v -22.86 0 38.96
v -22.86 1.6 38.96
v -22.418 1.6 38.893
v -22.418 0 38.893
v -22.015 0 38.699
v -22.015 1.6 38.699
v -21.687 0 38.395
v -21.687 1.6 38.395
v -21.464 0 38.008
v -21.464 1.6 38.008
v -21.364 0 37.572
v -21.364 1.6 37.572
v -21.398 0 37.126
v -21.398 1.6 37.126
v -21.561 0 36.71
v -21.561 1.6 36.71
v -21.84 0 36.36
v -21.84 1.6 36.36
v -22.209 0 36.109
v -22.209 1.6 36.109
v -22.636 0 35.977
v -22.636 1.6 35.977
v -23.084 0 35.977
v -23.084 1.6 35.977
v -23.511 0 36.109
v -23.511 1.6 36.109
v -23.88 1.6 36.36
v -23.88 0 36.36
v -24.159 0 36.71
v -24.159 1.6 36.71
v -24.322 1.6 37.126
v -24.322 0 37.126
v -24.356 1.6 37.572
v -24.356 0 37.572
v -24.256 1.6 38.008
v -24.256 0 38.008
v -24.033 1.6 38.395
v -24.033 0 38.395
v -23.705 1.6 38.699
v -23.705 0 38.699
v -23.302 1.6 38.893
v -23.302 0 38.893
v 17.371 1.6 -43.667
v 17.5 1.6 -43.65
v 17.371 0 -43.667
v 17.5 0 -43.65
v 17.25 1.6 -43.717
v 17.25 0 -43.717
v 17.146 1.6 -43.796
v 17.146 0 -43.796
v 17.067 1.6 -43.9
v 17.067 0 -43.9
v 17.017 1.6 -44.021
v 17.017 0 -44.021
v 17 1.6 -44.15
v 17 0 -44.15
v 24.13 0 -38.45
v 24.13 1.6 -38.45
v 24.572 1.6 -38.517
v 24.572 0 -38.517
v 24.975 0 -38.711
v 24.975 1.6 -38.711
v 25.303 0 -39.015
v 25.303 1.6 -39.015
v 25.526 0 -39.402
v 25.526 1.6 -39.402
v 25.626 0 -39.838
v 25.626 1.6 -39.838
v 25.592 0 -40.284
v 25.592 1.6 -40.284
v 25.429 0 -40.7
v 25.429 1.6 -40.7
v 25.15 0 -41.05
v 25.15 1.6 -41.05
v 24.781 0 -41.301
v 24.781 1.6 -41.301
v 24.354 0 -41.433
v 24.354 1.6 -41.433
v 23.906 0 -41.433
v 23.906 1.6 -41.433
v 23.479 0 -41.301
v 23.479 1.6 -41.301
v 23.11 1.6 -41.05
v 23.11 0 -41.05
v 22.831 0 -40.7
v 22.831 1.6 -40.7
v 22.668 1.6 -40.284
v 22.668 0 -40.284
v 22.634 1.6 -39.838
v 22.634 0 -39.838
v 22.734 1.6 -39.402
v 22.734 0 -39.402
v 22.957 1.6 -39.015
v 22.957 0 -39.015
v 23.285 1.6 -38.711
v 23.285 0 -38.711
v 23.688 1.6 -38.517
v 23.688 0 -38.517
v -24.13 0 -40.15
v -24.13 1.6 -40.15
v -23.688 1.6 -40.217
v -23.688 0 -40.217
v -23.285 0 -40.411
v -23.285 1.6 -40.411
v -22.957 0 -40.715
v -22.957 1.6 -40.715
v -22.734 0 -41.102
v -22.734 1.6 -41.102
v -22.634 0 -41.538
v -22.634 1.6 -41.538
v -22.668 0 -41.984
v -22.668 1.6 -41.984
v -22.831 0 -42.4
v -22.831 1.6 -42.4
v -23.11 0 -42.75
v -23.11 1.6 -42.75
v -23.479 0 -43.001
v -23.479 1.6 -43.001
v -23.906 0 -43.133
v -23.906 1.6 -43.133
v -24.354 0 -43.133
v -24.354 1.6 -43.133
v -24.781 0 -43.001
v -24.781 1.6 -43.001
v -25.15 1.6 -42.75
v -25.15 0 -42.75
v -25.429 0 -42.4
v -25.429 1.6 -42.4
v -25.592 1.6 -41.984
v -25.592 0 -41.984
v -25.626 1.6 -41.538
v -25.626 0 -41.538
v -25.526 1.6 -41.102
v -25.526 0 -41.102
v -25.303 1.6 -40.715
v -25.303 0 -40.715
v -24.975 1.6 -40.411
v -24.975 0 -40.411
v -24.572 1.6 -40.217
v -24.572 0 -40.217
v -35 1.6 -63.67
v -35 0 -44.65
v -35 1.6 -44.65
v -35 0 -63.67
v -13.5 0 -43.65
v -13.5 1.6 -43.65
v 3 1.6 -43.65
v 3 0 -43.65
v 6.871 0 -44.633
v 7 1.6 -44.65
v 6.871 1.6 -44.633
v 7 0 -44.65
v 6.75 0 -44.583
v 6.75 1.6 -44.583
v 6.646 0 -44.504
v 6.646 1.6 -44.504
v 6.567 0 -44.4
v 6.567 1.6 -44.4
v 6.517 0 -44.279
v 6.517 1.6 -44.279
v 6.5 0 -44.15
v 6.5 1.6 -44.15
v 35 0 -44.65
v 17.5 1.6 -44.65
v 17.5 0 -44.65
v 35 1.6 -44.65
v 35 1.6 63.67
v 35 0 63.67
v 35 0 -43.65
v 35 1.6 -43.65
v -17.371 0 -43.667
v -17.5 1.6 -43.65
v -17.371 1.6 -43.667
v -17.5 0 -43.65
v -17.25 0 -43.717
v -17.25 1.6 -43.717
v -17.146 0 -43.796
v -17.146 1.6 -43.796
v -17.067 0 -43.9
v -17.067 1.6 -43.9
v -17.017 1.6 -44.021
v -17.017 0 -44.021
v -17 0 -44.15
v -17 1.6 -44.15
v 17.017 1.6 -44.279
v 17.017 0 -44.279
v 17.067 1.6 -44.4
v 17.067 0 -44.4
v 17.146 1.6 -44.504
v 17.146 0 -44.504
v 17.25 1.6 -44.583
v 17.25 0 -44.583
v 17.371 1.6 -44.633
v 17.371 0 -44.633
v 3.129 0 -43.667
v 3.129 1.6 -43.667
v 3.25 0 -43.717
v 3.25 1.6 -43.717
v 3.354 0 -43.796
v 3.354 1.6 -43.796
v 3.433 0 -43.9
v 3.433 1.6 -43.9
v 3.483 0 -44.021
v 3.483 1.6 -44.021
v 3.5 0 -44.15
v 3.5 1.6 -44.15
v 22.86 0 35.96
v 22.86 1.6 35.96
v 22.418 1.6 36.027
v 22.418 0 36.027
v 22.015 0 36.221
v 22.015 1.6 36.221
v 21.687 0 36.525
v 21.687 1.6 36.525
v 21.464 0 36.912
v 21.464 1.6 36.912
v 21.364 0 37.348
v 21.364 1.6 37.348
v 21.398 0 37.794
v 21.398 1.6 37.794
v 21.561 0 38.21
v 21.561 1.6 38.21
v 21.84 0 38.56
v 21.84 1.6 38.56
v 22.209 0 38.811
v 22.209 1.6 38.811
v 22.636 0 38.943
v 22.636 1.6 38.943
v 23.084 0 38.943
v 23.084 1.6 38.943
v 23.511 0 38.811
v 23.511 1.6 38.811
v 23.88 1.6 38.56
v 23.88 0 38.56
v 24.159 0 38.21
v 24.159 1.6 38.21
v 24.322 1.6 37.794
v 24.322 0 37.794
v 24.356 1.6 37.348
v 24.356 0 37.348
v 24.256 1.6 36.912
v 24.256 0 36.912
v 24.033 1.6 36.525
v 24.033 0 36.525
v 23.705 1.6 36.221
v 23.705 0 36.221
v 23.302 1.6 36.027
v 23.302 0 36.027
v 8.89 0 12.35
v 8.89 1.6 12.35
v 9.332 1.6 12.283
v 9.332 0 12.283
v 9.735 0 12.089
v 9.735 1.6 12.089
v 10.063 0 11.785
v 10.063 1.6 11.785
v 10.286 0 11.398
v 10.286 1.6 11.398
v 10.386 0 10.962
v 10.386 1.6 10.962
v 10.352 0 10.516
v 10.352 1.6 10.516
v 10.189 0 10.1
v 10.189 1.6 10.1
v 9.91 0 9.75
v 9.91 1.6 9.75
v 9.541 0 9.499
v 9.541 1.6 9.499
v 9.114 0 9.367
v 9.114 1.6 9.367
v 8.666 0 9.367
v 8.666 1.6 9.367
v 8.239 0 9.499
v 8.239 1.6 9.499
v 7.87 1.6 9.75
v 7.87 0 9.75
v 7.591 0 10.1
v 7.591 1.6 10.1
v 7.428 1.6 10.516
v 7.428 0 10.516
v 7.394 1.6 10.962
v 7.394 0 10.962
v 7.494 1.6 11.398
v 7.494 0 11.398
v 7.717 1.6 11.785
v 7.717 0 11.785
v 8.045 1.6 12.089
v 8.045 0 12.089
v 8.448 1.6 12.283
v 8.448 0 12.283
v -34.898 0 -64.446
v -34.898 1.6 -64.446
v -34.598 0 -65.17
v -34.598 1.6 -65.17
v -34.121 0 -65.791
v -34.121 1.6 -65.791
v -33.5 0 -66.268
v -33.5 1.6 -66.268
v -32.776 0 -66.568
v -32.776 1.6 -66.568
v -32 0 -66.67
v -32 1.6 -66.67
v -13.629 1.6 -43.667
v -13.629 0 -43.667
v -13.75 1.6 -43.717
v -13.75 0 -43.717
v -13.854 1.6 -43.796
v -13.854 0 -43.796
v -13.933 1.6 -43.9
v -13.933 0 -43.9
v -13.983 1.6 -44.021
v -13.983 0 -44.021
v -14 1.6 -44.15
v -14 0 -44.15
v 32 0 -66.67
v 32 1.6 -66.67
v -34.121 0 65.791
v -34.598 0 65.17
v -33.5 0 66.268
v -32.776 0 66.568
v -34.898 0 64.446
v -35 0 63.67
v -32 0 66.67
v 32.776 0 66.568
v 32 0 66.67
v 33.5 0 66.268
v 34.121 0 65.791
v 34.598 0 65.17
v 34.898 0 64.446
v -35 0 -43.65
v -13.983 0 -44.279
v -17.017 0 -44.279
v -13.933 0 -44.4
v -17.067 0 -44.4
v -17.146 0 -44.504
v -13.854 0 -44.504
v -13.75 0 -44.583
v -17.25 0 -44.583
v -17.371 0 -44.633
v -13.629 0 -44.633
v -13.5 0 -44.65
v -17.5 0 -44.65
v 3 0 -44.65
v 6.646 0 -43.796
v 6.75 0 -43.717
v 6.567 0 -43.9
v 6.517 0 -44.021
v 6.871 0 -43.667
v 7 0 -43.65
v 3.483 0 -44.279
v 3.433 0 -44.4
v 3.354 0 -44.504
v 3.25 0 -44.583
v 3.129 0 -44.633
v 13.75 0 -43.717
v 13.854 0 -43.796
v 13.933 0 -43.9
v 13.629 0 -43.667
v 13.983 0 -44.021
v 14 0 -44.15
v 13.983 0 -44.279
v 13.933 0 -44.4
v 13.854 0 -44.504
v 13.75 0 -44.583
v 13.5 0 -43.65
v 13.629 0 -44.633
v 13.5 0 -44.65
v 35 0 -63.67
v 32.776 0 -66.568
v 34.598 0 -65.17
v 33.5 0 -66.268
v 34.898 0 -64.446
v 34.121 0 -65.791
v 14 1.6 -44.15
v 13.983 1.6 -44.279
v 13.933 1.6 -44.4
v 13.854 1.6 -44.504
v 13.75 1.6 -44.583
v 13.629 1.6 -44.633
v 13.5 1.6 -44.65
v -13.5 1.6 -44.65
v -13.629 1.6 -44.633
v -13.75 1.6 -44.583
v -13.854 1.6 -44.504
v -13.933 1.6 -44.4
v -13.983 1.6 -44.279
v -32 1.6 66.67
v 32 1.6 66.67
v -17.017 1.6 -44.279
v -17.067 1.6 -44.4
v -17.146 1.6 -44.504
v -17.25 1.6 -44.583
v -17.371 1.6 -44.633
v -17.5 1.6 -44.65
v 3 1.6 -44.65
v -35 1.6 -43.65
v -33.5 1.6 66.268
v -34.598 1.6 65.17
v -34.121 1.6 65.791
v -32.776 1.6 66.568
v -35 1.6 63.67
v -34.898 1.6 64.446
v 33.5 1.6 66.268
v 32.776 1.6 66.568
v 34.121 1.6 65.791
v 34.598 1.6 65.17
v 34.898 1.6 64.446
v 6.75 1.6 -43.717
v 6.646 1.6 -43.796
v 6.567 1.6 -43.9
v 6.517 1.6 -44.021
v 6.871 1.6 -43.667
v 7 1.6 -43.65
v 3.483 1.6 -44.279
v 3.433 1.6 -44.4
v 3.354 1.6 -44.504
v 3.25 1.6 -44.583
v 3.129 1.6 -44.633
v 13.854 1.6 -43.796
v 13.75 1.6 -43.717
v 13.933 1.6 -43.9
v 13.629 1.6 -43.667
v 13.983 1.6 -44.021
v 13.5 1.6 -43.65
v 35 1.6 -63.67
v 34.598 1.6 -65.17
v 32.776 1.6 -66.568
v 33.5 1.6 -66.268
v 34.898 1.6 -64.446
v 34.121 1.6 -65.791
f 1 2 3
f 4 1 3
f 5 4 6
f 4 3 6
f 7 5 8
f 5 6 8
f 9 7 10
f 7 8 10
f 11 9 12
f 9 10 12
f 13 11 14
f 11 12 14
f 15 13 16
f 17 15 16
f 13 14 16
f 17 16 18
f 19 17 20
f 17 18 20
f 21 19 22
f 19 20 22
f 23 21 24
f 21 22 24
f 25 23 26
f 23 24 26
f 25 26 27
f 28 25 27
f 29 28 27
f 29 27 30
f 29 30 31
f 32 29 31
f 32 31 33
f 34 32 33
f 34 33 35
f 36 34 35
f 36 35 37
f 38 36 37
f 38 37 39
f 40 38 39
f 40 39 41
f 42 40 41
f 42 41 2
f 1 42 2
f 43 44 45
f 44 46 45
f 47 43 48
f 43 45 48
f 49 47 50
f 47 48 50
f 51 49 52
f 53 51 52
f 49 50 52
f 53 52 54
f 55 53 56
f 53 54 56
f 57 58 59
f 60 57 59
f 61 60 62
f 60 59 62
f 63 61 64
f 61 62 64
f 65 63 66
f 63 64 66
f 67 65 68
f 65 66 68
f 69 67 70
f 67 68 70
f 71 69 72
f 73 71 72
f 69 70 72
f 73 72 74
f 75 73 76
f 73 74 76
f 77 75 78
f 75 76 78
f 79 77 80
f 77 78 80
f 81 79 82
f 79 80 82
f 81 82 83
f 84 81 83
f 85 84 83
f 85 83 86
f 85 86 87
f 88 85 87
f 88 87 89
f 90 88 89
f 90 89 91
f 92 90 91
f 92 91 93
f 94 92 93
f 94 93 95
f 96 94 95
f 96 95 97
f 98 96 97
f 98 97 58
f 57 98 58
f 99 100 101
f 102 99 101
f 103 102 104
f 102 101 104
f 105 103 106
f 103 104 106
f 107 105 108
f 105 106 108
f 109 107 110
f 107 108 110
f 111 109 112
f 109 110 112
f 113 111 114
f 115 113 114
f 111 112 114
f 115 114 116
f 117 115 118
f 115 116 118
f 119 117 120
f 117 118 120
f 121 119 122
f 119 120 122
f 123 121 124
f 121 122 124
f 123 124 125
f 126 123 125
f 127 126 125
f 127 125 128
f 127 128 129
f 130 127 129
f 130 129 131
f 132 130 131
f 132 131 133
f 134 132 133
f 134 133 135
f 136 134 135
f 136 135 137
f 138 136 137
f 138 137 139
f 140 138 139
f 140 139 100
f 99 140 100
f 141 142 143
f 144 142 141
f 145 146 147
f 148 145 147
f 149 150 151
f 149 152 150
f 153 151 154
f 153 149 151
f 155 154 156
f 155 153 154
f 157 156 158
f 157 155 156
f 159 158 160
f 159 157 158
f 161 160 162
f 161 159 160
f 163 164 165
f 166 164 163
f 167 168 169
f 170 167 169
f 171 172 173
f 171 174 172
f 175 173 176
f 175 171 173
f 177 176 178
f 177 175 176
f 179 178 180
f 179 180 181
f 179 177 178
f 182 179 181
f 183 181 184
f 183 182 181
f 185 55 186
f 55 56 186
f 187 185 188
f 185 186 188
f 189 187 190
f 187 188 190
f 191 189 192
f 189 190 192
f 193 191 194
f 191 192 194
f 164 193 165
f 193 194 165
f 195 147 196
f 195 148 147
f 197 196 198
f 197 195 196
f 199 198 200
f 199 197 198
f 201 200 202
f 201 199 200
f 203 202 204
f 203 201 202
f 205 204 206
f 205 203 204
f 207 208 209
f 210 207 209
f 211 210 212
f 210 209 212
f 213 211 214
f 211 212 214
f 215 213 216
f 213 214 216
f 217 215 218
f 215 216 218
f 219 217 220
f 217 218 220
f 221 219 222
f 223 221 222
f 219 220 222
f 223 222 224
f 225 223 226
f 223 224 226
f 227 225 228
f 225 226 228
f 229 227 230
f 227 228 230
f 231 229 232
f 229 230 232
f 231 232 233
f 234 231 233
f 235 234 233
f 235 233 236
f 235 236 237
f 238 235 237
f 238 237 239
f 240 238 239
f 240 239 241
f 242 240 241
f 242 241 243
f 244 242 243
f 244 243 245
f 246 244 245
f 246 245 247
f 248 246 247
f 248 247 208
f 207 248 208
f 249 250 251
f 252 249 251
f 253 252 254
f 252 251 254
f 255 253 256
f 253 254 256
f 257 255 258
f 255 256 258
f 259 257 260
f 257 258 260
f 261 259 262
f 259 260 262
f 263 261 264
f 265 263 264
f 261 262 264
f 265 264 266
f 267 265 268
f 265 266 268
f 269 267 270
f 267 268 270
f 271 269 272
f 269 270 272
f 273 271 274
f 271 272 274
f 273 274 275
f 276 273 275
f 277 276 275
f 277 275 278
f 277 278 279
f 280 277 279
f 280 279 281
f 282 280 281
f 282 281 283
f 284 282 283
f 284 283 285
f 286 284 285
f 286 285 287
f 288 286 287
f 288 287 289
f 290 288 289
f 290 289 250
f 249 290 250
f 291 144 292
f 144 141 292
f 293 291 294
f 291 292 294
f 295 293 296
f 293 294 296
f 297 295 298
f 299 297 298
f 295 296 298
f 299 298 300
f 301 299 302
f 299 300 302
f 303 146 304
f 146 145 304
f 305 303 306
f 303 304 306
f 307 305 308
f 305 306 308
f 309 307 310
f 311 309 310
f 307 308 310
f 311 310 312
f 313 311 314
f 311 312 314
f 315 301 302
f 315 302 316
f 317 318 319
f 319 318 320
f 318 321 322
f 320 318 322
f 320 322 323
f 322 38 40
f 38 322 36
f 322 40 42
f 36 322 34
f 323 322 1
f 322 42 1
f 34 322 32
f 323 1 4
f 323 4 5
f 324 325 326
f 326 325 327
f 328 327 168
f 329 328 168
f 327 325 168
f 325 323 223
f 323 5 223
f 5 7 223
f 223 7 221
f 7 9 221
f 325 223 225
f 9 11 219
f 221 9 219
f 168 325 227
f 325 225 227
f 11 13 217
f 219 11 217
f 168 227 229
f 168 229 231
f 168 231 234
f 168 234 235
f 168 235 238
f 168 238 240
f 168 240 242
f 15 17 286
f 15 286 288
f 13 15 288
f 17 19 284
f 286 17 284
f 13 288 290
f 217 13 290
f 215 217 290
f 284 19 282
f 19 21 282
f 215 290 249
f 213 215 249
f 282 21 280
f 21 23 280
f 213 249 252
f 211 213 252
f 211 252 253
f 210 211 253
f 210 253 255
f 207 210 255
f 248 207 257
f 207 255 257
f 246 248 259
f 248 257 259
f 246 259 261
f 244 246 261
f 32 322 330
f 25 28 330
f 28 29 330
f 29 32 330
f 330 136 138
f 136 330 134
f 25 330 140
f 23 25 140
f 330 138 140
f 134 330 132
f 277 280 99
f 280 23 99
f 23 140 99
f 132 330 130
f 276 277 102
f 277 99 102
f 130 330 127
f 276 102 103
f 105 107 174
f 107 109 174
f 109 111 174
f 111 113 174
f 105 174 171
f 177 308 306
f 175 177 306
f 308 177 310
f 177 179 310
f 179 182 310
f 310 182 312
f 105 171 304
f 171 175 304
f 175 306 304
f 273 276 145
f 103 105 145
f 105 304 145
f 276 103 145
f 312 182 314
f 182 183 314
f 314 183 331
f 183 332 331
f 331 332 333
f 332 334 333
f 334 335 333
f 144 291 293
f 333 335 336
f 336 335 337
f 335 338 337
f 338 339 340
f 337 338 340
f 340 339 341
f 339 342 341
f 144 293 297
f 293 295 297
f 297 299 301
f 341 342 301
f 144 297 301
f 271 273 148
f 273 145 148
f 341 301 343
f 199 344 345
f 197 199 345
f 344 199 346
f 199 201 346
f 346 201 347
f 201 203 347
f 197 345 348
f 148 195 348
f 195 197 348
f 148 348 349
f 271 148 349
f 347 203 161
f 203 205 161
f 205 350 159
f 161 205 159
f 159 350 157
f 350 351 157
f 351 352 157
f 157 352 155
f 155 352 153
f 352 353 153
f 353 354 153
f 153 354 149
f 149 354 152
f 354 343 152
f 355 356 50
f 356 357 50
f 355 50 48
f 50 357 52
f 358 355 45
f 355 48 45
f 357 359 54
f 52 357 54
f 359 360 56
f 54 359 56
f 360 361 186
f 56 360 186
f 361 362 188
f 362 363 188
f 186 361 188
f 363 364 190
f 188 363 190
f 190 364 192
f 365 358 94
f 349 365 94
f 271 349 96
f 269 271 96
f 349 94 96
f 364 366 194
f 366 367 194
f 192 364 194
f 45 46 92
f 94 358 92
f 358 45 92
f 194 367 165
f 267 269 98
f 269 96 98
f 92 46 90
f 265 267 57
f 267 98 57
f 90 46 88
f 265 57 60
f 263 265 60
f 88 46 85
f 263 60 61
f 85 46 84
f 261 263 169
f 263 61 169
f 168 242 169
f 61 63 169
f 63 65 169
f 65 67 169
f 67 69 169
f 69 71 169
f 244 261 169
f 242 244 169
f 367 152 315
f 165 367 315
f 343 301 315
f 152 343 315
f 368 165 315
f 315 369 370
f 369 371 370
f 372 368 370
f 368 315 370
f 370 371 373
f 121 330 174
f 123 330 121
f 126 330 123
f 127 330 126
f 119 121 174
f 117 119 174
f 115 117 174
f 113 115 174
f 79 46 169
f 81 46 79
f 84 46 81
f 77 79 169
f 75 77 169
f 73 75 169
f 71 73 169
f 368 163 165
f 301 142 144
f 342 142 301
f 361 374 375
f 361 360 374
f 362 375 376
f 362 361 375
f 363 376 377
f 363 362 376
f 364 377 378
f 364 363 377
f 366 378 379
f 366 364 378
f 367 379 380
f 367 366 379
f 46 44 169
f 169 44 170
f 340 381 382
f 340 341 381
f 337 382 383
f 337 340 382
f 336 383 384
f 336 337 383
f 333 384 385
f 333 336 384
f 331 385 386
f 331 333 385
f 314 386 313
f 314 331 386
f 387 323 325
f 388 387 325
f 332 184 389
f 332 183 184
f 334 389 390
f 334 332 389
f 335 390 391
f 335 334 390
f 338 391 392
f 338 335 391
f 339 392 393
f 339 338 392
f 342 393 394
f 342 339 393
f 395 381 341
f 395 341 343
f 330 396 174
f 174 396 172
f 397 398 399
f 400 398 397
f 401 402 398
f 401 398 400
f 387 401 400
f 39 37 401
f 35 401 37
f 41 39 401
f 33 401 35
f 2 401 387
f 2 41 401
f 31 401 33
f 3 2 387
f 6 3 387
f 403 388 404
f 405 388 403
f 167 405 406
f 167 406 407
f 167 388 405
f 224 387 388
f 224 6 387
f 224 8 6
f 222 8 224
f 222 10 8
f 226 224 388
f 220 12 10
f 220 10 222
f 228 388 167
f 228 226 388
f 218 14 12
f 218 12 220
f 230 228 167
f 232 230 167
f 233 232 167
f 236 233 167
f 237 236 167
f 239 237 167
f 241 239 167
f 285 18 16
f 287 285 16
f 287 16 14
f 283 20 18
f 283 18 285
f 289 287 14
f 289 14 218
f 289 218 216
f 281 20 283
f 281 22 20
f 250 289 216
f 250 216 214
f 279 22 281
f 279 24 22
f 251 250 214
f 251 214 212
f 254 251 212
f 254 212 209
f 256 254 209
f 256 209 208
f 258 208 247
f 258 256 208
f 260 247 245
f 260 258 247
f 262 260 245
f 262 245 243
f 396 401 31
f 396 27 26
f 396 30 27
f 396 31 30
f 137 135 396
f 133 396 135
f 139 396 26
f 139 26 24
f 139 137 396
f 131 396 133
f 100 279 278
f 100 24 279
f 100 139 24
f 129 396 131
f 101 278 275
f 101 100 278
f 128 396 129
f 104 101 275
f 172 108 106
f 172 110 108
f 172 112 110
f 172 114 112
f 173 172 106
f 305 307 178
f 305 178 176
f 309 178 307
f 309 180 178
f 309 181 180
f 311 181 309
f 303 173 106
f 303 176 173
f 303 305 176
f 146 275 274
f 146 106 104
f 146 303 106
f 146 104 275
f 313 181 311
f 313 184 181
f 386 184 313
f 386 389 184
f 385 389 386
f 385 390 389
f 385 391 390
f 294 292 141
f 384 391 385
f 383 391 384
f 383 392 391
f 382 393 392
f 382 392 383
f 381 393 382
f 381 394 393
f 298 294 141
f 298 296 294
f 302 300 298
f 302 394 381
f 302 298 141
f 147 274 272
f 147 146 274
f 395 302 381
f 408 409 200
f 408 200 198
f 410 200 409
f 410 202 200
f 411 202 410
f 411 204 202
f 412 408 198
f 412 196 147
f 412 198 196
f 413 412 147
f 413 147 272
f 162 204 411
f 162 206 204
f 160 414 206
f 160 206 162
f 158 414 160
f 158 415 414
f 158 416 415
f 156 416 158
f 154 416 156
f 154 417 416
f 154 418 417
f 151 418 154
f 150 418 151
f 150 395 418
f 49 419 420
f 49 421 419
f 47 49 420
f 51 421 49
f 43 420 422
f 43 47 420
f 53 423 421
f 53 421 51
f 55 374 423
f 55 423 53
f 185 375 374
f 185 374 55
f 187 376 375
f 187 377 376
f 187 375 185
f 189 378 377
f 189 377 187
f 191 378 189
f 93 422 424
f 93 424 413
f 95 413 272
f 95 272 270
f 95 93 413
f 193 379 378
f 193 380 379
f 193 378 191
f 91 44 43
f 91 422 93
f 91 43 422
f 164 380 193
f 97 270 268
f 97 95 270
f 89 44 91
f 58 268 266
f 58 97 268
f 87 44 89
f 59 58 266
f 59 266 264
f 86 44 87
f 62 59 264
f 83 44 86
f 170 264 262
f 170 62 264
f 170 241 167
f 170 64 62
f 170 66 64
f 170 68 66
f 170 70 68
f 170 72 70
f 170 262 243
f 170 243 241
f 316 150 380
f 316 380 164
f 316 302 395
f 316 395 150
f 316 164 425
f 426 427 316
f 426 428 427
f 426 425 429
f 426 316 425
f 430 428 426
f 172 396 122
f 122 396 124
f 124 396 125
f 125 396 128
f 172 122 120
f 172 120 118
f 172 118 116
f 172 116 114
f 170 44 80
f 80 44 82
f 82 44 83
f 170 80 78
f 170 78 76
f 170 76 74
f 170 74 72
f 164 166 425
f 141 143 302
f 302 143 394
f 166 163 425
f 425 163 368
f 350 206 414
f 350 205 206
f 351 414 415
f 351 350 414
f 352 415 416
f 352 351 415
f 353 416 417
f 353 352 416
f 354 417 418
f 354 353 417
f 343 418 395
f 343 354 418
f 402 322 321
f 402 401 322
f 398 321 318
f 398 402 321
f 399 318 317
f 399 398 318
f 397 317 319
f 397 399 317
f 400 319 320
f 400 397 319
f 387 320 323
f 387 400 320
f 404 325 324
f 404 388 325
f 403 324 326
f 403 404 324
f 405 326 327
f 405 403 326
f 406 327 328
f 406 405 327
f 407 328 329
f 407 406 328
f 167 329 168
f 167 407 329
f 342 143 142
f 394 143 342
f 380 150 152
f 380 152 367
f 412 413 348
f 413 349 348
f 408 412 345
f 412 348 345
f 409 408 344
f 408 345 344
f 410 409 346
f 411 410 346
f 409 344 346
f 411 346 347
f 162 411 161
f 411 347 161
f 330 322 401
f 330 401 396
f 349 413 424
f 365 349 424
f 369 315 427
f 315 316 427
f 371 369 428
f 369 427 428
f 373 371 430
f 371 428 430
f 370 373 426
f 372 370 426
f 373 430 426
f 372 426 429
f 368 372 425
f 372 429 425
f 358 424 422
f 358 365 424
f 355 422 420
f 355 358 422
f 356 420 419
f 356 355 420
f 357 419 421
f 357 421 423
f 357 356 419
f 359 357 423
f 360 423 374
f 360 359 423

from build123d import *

# Parameters (mm, degrees)
SKETCH_1_W          = 70
SKETCH_1_H          = 133.34
EXTRUDE_1_DEPTH     = 1.6
SKETCH_2_R          = 1.5
SKETCH_2_W          = 18
SKETCH_2_H          = 1
SKETCH_2_W_2        = 17.5
SKETCH_2_W_3        = 7.5
CUT_EXTRUDE_1_DEPTH = 76.315661718
FILLET_1_R          = 3
FILLET_2_R          = 0.5


with BuildPart() as part:
    # ｽｹｯﾁ1 → ﾎﾞｽ - 押し出し1 (new body)
    with BuildSketch(Plane(origin=(0, 0, 0), x_dir=(1, 0, 0), z_dir=(0, 1, 0))):
        Rectangle(SKETCH_1_W, SKETCH_1_H)
    extrude(amount=EXTRUDE_1_DEPTH)

    # ｽｹｯﾁ2 → ｶｯﾄ - 押し出し1 (cut, through all)
    with BuildSketch(Plane(origin=(0, 1.6, 0), x_dir=(1, 0, 0), z_dir=(0, 1, 0))):
        with Locations(Location((-22.86, -37.46, 0), (0, 0, 270))):
            Circle(SKETCH_2_R)
        with Locations(Location((22.86, -37.46, 0), (0, 0, 90))):
            Circle(SKETCH_2_R)
        with Locations(Location((-24.13, 41.65, 0), (0, 0, 270))):
            Circle(SKETCH_2_R)
        with Locations(Location((24.13, 39.95, 0), (0, 0, 270))):
            Circle(SKETCH_2_R)
        with Locations(Location((8.89, -10.85, 0), (0, 0, 270))):
            Circle(SKETCH_2_R)
        with Locations((-26, 44.15)):
            Rectangle(SKETCH_2_W, SKETCH_2_H)
        with Locations((26, 44.15)):
            Rectangle(SKETCH_2_W, SKETCH_2_H)
        with Locations((-5.25, 44.15)):
            Rectangle(SKETCH_2_W_2, SKETCH_2_H)
        with Locations((10.25, 44.15)):
            Rectangle(SKETCH_2_W_3, SKETCH_2_H)
    extrude(amount=-CUT_EXTRUDE_1_DEPTH, mode=Mode.SUBTRACT)

    # ﾌｨﾚｯﾄ1
    fillet_1_edges = [part.edges().sort_by_distance(p)[0] for p in [
        (35, 0.8, 66.67),
        (-35, 0.8, 66.67),
        (-35, 0.8, -66.67),
        (35, 0.8, -66.67),
    ]]
    fillet(fillet_1_edges, radius=FILLET_1_R)

    # ﾌｨﾚｯﾄ2
    fillet_2_edges = [part.edges().sort_by_distance(p)[0] for p in [
        (17, 0.8, -44.65),
        (17, 0.8, -43.65),
        (14, 0.8, -43.65),
        (14, 0.8, -44.65),
        (6.5, 0.8, -44.65),
        (6.5, 0.8, -43.65),
        (3.5, 0.8, -43.65),
        (3.5, 0.8, -44.65),
        (-17, 0.8, -44.65),
        (-17, 0.8, -43.65),
        (-14, 0.8, -43.65),
        (-14, 0.8, -44.65),
    ]]
    fillet(fillet_2_edges, radius=FILLET_2_R - 0.0001)  # a hair under: the kernel refuses the full size


solid = part.part
